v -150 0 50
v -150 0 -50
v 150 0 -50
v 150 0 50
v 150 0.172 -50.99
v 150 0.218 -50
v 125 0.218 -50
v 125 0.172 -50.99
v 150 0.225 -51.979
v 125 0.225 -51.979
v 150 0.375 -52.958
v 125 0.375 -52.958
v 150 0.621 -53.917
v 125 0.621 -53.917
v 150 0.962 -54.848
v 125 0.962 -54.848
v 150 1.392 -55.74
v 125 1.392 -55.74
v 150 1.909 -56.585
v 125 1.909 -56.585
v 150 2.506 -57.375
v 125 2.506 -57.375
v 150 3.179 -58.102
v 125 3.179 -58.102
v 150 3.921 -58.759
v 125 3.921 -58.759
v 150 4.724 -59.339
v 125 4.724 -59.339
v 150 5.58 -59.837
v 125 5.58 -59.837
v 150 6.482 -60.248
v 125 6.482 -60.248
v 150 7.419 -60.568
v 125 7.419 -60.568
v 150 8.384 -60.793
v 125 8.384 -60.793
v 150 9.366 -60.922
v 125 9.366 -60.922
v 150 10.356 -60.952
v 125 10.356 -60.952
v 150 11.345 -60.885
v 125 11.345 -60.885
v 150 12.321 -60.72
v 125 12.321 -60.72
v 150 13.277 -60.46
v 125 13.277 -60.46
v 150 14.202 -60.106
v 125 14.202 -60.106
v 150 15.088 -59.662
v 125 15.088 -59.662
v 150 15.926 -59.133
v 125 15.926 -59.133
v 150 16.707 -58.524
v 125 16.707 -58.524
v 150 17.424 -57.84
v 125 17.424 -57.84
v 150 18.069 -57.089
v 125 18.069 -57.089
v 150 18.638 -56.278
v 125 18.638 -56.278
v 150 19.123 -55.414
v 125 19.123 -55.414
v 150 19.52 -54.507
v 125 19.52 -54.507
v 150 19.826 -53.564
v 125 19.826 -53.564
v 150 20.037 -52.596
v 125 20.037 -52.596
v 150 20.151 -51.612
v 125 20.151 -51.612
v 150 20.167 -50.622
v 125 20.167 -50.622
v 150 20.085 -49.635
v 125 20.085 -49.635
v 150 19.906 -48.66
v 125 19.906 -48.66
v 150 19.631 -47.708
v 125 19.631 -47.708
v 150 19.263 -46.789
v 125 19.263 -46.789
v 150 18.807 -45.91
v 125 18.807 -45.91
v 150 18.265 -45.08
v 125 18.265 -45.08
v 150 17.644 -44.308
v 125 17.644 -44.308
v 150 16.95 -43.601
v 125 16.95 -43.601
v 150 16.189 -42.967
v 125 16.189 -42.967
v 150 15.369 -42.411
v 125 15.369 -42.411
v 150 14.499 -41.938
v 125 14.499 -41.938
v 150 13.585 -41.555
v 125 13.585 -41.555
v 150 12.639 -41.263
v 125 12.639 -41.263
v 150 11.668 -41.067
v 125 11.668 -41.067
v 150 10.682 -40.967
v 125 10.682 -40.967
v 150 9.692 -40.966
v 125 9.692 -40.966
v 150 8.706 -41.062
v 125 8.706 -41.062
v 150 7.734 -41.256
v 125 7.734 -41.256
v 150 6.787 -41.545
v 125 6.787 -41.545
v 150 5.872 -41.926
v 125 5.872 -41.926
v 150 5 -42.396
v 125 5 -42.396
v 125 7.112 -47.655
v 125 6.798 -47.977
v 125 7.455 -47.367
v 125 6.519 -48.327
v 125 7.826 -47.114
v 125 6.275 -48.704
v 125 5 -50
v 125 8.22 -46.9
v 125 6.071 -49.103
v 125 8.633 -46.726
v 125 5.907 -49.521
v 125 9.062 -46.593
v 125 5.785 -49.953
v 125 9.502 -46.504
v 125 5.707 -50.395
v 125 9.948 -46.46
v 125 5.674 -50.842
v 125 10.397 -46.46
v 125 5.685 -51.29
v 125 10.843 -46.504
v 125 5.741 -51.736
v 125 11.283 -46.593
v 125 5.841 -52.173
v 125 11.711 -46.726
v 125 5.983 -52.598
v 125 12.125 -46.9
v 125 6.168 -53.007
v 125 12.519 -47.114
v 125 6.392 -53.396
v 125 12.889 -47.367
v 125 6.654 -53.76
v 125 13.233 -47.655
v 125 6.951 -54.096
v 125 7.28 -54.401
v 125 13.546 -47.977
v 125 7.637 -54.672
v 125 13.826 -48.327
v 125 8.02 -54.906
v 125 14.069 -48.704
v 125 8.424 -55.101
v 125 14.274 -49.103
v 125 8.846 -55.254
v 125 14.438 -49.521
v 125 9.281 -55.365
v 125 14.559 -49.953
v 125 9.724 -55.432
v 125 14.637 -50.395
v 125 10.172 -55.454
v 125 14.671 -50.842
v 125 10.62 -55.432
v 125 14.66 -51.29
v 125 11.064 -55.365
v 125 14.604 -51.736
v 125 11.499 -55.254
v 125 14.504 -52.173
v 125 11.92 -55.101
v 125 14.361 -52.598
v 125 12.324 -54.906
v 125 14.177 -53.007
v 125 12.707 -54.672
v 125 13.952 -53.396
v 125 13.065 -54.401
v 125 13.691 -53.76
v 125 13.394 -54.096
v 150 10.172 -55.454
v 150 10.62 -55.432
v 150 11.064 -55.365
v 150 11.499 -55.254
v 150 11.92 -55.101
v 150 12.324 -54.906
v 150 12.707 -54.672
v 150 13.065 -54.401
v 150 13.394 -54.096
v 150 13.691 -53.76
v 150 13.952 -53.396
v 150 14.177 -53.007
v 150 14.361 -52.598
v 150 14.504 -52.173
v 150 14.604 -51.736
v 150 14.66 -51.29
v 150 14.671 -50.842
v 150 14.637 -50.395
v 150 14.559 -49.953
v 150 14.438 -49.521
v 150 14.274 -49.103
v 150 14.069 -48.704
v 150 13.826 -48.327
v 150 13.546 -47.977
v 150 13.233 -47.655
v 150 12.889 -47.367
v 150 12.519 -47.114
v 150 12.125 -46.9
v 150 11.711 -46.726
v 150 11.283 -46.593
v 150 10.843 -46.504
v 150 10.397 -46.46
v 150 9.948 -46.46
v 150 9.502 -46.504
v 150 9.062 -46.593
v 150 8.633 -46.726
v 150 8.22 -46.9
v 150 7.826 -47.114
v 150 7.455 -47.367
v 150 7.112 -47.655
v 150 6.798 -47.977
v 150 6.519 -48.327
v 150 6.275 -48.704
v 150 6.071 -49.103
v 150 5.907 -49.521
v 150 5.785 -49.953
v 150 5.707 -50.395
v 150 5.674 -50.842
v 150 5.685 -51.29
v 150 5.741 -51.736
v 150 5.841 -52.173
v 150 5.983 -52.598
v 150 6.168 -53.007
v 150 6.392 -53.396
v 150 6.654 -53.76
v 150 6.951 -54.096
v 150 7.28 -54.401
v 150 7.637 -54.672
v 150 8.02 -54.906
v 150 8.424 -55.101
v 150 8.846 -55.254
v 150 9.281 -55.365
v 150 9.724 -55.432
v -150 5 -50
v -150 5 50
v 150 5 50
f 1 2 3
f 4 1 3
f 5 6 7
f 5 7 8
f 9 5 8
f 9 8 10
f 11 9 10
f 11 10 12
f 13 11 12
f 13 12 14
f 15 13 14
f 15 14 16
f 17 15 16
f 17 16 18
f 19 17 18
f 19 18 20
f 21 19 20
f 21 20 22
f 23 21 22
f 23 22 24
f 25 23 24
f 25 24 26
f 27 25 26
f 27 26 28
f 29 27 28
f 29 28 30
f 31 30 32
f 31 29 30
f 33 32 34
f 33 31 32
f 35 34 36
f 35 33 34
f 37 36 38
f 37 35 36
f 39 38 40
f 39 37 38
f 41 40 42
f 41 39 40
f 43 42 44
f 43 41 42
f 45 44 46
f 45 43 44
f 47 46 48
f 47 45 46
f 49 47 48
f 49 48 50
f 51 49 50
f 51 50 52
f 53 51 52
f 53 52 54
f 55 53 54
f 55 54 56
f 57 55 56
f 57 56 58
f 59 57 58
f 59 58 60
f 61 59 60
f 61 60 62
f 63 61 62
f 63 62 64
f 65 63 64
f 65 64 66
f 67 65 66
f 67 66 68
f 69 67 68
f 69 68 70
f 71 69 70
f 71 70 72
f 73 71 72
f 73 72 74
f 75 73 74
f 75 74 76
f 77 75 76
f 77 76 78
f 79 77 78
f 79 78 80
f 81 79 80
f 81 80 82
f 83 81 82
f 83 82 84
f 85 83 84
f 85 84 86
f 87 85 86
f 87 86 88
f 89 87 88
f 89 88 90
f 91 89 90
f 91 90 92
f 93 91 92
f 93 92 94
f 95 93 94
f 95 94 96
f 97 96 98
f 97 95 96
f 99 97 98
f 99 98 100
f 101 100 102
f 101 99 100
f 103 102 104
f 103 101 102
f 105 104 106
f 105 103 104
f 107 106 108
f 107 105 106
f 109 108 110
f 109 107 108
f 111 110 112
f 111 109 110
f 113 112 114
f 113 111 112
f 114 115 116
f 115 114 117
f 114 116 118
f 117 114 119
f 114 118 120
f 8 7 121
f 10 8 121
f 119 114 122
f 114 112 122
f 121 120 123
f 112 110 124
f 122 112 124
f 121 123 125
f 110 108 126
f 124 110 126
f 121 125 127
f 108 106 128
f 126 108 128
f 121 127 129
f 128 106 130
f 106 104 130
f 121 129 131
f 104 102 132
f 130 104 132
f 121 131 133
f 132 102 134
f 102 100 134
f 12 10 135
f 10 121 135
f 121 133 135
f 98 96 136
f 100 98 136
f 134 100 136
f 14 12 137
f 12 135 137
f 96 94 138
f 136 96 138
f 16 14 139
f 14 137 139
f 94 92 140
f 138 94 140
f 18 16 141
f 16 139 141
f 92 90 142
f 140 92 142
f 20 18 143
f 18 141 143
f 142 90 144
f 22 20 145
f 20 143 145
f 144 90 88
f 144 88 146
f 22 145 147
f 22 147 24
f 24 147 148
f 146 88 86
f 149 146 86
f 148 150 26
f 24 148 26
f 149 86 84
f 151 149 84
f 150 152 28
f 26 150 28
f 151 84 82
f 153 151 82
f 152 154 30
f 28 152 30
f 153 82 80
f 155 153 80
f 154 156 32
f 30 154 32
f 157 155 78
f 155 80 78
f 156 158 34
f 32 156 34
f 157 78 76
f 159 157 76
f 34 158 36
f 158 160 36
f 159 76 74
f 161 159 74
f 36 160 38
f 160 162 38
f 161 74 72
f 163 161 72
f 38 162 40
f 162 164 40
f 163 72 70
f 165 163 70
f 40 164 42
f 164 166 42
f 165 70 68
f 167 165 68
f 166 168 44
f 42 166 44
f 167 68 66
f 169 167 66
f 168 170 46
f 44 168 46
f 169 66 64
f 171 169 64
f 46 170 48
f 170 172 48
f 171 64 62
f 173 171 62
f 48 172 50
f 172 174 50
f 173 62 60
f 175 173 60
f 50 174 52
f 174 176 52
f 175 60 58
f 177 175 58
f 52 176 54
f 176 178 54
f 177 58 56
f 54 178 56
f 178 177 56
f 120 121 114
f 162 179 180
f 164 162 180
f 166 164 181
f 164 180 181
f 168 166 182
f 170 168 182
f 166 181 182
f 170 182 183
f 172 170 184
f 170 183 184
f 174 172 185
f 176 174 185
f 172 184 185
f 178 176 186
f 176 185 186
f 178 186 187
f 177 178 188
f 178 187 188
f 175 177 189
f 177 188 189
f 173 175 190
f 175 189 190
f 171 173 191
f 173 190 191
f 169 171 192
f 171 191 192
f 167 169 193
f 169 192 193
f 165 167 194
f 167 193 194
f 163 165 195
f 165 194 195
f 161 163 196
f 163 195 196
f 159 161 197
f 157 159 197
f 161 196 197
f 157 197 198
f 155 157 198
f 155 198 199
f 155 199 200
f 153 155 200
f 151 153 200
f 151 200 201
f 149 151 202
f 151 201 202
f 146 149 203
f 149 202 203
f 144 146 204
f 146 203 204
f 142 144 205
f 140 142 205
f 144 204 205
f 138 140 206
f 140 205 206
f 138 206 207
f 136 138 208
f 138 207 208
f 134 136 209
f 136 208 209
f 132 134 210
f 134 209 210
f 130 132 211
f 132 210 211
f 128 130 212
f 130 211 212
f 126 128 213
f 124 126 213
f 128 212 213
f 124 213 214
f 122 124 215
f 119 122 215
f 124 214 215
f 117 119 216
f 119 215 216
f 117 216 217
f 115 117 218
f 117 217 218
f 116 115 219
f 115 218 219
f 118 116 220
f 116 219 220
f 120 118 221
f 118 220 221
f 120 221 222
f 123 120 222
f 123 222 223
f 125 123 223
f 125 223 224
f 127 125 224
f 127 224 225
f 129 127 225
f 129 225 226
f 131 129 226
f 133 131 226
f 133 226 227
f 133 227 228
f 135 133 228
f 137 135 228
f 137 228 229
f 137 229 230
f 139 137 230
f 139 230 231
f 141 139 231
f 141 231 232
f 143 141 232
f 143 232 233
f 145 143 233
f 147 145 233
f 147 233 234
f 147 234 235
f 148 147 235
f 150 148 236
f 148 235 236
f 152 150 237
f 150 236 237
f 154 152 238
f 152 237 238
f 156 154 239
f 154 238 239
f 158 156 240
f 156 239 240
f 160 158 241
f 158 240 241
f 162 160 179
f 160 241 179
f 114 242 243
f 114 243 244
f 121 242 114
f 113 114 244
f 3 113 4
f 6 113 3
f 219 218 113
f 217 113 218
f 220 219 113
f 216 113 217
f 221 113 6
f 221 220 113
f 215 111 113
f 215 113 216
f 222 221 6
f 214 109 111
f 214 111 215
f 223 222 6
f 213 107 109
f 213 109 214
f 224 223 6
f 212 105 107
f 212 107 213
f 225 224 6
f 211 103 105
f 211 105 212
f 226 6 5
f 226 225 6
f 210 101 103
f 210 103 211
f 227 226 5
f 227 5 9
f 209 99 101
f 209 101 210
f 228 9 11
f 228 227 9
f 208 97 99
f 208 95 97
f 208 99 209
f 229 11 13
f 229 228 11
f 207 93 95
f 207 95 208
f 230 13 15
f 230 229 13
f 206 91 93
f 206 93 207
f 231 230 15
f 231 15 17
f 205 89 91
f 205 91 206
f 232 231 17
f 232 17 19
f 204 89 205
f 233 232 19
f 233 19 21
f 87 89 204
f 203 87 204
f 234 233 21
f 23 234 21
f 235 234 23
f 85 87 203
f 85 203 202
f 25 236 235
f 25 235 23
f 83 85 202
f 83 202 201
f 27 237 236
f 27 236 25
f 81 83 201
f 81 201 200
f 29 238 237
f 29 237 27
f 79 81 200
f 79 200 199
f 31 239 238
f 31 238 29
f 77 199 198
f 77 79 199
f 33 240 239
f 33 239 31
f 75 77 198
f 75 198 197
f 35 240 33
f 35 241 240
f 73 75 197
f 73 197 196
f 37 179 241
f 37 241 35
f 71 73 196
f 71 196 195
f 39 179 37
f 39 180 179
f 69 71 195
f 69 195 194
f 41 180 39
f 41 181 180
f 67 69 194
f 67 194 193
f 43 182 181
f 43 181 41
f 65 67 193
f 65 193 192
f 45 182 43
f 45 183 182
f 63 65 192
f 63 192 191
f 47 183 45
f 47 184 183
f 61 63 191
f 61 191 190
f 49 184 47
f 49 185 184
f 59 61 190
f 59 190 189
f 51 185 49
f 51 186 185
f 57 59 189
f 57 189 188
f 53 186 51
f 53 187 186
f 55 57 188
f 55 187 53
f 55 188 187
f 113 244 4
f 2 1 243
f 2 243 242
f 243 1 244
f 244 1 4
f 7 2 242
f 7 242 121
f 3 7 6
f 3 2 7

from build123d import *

# Parameters (mm, degrees)
SKETCH1_W           = 300
SKETCH1_H           = 100
BOSS_EXTRUDE1_DEPTH = 5
SKETCH7_R           = 10
BOSS_EXTRUDE5_DEPTH = 25
SKETCH10_R          = 4.5
CUT_EXTRUDE1_DEPTH  = 25


with BuildPart() as part:
    # Sketch1 → Boss-Extrude1 (new body)
    with BuildSketch(Plane(origin=(0, 0, 0), x_dir=(1, 0, 0), z_dir=(0, 1, 0))):
        Rectangle(SKETCH1_W, SKETCH1_H)
    extrude(amount=BOSS_EXTRUDE1_DEPTH)

    # Sketch7 → Boss-Extrude5 (add)
    with BuildSketch(Plane(origin=(150, 0, 0), x_dir=(0, 0, -1), z_dir=(1, 0, 0))):
        with Locations((50.954154719, 10.172311349)):
            Circle(SKETCH7_R)
    extrude(amount=-BOSS_EXTRUDE5_DEPTH)

    # Sketch10 → Cut-Extrude1 (cut)
    with BuildSketch(Plane(origin=(150, 0, 0), x_dir=(0, 0, -1), z_dir=(1, 0, 0))):
        with Locations((50.954154719, 10.172311349)):
            Circle(SKETCH10_R)
    extrude(amount=-CUT_EXTRUDE1_DEPTH, mode=Mode.SUBTRACT)


solid = part.part
